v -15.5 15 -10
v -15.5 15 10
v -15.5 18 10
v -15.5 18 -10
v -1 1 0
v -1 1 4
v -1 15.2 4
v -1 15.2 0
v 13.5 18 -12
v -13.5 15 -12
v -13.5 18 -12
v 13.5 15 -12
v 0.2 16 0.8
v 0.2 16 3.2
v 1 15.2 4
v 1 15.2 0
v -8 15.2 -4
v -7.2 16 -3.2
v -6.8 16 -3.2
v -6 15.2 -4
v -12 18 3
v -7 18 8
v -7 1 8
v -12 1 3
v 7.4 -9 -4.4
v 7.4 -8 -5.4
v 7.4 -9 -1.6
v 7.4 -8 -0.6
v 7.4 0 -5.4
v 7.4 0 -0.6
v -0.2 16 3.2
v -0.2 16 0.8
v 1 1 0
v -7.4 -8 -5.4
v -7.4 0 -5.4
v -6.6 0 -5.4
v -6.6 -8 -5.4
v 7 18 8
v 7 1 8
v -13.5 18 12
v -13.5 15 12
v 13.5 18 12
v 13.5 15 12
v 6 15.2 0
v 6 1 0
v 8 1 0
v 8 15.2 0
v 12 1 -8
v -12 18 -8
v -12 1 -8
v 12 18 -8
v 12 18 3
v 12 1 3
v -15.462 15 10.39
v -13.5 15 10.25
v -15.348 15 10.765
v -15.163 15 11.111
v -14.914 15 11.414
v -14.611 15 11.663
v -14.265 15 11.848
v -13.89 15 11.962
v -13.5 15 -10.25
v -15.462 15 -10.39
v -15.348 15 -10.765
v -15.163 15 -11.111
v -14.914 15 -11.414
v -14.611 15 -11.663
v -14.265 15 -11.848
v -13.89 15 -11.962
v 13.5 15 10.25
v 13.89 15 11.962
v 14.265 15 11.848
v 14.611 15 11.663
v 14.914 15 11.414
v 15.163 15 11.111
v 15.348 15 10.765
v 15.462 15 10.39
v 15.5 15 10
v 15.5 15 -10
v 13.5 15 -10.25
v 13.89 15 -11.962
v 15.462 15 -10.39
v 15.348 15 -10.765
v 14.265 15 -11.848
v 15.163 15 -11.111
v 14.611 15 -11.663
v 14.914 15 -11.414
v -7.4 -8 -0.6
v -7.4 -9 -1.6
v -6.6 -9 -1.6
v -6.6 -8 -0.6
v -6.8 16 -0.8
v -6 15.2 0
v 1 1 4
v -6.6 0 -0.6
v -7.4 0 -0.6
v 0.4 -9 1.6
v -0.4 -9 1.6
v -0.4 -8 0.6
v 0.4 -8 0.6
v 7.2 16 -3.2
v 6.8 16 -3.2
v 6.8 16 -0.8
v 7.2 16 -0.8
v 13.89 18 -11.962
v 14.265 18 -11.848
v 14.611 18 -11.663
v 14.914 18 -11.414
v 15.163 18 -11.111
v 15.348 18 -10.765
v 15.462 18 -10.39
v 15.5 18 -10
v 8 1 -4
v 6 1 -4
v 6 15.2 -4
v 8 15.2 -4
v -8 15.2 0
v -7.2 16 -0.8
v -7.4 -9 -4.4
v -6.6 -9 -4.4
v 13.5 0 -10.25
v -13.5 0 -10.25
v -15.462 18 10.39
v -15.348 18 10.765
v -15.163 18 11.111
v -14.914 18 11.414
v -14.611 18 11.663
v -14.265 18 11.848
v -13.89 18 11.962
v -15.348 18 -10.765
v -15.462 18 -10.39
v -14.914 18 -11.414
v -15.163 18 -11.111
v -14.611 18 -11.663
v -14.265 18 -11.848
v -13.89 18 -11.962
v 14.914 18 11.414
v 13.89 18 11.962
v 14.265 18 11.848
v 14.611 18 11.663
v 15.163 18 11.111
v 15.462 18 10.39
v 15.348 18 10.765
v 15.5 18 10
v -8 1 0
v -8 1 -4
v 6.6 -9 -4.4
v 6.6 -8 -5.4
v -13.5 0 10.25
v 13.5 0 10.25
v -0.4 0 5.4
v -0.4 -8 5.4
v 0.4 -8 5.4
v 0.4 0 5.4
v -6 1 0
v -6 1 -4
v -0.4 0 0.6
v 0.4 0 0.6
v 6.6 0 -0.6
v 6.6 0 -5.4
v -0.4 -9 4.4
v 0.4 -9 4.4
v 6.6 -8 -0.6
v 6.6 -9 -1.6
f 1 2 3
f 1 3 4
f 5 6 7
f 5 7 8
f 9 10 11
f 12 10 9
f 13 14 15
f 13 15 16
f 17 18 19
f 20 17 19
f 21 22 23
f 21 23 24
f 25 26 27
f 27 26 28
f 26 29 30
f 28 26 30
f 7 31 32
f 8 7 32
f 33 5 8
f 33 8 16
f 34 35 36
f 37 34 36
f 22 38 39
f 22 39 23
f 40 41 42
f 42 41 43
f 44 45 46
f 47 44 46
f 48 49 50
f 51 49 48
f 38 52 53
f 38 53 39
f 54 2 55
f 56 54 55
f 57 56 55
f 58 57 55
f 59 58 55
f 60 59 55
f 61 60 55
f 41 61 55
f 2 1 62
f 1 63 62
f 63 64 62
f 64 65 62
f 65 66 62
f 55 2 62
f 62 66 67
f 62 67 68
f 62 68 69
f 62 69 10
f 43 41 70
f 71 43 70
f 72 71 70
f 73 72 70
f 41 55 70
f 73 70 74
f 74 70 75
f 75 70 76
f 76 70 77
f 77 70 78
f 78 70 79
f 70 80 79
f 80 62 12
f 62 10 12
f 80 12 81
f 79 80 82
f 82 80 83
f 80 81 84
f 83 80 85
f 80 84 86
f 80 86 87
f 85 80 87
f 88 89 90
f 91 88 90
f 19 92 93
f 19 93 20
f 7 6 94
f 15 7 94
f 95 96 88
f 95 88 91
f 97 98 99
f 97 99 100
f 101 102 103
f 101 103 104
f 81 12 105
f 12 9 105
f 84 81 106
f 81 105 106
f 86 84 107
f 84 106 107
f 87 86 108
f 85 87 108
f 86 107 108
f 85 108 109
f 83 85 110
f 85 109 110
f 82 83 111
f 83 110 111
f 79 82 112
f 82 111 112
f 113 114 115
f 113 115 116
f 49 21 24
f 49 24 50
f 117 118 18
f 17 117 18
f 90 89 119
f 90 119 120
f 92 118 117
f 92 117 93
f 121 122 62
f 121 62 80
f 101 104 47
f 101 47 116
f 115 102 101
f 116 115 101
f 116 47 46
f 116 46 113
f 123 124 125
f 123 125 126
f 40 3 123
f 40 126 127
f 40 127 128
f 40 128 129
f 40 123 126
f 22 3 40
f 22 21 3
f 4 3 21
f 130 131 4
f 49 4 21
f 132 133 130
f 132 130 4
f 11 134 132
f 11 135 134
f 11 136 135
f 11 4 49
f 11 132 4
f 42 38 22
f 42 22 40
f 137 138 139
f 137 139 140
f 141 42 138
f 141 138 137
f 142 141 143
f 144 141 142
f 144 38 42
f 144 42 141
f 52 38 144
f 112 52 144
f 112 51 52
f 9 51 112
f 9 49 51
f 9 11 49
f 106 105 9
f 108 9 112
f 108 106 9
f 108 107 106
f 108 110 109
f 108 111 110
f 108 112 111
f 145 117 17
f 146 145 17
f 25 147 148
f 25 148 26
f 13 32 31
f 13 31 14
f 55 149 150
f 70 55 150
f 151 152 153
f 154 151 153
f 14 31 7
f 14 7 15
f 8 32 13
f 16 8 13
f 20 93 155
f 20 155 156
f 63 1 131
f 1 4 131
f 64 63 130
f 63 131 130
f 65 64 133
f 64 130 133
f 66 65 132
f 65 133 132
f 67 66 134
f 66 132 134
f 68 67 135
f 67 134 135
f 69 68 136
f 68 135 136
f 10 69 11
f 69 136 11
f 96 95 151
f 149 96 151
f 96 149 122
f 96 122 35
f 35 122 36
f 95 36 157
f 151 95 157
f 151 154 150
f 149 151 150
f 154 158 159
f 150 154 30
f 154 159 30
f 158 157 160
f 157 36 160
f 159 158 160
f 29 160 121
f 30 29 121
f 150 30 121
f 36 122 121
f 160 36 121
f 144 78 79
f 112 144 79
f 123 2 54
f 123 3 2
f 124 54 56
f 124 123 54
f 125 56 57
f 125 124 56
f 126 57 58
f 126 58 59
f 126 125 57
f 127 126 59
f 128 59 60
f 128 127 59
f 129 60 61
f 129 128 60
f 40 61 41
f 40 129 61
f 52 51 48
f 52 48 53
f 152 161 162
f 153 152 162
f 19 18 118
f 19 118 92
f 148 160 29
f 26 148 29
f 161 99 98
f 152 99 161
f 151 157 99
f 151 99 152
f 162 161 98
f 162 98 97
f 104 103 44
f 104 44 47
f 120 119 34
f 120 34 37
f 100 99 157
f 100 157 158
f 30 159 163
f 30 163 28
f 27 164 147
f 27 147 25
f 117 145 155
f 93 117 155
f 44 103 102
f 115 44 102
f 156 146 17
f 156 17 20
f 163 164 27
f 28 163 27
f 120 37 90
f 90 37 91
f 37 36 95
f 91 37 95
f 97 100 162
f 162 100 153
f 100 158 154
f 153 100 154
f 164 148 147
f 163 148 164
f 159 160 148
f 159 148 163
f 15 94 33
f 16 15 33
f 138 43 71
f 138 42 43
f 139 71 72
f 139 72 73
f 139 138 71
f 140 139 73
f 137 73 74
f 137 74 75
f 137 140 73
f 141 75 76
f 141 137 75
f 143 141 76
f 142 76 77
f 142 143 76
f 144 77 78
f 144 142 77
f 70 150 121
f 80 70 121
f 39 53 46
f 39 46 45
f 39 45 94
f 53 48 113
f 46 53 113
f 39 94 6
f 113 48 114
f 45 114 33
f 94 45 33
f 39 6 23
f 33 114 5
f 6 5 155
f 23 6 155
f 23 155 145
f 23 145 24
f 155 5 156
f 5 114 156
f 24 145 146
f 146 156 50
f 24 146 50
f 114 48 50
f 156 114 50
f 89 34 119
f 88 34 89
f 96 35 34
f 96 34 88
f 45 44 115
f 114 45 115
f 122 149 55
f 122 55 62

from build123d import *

# Parameters (mm, degrees)
SKETCH_1_W          = 27
SKETCH_1_H          = 20.5
EXTRUDE_1_DEPTH     = 15
SKETCH_2_W          = 0.8
SKETCH_2_H          = 4.8
EXTRUDE_2_DEPTH     = 9
CHAMFER_1_SIZE      = 1
SKETCH_3_W          = 31
SKETCH_3_H          = 24
EXTRUDE_3_DEPTH     = 3
CUT_EXTRUDE_1_DEPTH = 17
SKETCH_5_W          = 2
SKETCH_5_H          = 4
EXTRUDE_4_DEPTH     = 15
CHAMFER_2_SIZE      = 0.8
FILLET_1_R          = 2


with BuildPart() as part:
    # Эскиз1 → Бобышка-Вытянуть1 (new body)
    with BuildSketch(Plane(origin=(0, 0, 0), x_dir=(1, 0, 0), z_dir=(0, 1, 0))):
        Rectangle(SKETCH_1_W, SKETCH_1_H)
    extrude(amount=EXTRUDE_1_DEPTH)

    # Эскиз2 → Бобышка-Вытянуть2 (add)
    with BuildSketch(Plane.XZ):
        with Locations((0, 3)):
            Rectangle(SKETCH_2_W, SKETCH_2_H)
        with Locations((-7, -3)):
            Rectangle(SKETCH_2_W, SKETCH_2_H)
        with Locations((7, -3)):
            Rectangle(SKETCH_2_W, SKETCH_2_H)
    extrude(amount=EXTRUDE_2_DEPTH)

    # Фаска1
    chamfer_1_edges = [part.edges().sort_by_distance(p)[0] for p in [
        (-7, -9, -0.6),
        (-7, -9, -5.4),
        (0, -9, 5.4),
        (0, -9, 0.6),
        (7, -9, -0.6),
        (7, -9, -5.4),
    ]]
    chamfer(chamfer_1_edges, length=CHAMFER_1_SIZE)

    # Эскиз3 → Бобышка-Вытянуть3 (add)
    with BuildSketch(Plane(origin=(0, 15, 0), x_dir=(1, 0, 0), z_dir=(0, 1, 0))):
        Rectangle(SKETCH_3_W, SKETCH_3_H)
    extrude(amount=EXTRUDE_3_DEPTH)

    # Эскиз4 → Вырез-Вытянуть1 (cut)
    with BuildSketch(Plane(origin=(0, 18, 0), x_dir=(1, 0, 0), z_dir=(0, 1, 0))):
        Polygon((12, -3), (7, -8), (-7, -8), (-12, -3), (-12, 8), (12, 8), align=None)
    extrude(amount=-CUT_EXTRUDE_1_DEPTH, mode=Mode.SUBTRACT)

    # Эскиз5 → Бобышка-Вытянуть4 (add)
    with BuildSketch(Plane(origin=(0, 1, 0), x_dir=(1, 0, 0), z_dir=(0, 1, 0))):
        with Locations((7, 2)):
            Rectangle(SKETCH_5_W, SKETCH_5_H)
        with Locations((0, -2)):
            Rectangle(SKETCH_5_W, SKETCH_5_H)
        with Locations((-7, 2)):
            Rectangle(SKETCH_5_W, SKETCH_5_H)
    extrude(amount=EXTRUDE_4_DEPTH)

    # Фаска2
    chamfer_2_edges = [part.edges().sort_by_distance(p)[0] for p in [
        (-1, 16, 2),
        (0, 16, 4),
        (1, 16, 2),
        (0, 16, 0),
        (6, 16, -2),
        (7, 16, 0),
        (8, 16, -2),
        (7, 16, -4),
        (-7, 16, -4),
        (-8, 16, -2),
        (-7, 16, 0),
        (-6, 16, -2),
    ]]
    chamfer(chamfer_2_edges, length=CHAMFER_2_SIZE)

    # Скругление1
    fillet_1_edges = [part.edges().sort_by_distance(p)[0] for p in [
        (-15.5, 16.5, -12),
        (-15.5, 16.5, 12),
        (15.5, 16.5, 12),
        (15.5, 16.5, -12),
    ]]
    fillet(fillet_1_edges, radius=FILLET_1_R)


solid = part.part
